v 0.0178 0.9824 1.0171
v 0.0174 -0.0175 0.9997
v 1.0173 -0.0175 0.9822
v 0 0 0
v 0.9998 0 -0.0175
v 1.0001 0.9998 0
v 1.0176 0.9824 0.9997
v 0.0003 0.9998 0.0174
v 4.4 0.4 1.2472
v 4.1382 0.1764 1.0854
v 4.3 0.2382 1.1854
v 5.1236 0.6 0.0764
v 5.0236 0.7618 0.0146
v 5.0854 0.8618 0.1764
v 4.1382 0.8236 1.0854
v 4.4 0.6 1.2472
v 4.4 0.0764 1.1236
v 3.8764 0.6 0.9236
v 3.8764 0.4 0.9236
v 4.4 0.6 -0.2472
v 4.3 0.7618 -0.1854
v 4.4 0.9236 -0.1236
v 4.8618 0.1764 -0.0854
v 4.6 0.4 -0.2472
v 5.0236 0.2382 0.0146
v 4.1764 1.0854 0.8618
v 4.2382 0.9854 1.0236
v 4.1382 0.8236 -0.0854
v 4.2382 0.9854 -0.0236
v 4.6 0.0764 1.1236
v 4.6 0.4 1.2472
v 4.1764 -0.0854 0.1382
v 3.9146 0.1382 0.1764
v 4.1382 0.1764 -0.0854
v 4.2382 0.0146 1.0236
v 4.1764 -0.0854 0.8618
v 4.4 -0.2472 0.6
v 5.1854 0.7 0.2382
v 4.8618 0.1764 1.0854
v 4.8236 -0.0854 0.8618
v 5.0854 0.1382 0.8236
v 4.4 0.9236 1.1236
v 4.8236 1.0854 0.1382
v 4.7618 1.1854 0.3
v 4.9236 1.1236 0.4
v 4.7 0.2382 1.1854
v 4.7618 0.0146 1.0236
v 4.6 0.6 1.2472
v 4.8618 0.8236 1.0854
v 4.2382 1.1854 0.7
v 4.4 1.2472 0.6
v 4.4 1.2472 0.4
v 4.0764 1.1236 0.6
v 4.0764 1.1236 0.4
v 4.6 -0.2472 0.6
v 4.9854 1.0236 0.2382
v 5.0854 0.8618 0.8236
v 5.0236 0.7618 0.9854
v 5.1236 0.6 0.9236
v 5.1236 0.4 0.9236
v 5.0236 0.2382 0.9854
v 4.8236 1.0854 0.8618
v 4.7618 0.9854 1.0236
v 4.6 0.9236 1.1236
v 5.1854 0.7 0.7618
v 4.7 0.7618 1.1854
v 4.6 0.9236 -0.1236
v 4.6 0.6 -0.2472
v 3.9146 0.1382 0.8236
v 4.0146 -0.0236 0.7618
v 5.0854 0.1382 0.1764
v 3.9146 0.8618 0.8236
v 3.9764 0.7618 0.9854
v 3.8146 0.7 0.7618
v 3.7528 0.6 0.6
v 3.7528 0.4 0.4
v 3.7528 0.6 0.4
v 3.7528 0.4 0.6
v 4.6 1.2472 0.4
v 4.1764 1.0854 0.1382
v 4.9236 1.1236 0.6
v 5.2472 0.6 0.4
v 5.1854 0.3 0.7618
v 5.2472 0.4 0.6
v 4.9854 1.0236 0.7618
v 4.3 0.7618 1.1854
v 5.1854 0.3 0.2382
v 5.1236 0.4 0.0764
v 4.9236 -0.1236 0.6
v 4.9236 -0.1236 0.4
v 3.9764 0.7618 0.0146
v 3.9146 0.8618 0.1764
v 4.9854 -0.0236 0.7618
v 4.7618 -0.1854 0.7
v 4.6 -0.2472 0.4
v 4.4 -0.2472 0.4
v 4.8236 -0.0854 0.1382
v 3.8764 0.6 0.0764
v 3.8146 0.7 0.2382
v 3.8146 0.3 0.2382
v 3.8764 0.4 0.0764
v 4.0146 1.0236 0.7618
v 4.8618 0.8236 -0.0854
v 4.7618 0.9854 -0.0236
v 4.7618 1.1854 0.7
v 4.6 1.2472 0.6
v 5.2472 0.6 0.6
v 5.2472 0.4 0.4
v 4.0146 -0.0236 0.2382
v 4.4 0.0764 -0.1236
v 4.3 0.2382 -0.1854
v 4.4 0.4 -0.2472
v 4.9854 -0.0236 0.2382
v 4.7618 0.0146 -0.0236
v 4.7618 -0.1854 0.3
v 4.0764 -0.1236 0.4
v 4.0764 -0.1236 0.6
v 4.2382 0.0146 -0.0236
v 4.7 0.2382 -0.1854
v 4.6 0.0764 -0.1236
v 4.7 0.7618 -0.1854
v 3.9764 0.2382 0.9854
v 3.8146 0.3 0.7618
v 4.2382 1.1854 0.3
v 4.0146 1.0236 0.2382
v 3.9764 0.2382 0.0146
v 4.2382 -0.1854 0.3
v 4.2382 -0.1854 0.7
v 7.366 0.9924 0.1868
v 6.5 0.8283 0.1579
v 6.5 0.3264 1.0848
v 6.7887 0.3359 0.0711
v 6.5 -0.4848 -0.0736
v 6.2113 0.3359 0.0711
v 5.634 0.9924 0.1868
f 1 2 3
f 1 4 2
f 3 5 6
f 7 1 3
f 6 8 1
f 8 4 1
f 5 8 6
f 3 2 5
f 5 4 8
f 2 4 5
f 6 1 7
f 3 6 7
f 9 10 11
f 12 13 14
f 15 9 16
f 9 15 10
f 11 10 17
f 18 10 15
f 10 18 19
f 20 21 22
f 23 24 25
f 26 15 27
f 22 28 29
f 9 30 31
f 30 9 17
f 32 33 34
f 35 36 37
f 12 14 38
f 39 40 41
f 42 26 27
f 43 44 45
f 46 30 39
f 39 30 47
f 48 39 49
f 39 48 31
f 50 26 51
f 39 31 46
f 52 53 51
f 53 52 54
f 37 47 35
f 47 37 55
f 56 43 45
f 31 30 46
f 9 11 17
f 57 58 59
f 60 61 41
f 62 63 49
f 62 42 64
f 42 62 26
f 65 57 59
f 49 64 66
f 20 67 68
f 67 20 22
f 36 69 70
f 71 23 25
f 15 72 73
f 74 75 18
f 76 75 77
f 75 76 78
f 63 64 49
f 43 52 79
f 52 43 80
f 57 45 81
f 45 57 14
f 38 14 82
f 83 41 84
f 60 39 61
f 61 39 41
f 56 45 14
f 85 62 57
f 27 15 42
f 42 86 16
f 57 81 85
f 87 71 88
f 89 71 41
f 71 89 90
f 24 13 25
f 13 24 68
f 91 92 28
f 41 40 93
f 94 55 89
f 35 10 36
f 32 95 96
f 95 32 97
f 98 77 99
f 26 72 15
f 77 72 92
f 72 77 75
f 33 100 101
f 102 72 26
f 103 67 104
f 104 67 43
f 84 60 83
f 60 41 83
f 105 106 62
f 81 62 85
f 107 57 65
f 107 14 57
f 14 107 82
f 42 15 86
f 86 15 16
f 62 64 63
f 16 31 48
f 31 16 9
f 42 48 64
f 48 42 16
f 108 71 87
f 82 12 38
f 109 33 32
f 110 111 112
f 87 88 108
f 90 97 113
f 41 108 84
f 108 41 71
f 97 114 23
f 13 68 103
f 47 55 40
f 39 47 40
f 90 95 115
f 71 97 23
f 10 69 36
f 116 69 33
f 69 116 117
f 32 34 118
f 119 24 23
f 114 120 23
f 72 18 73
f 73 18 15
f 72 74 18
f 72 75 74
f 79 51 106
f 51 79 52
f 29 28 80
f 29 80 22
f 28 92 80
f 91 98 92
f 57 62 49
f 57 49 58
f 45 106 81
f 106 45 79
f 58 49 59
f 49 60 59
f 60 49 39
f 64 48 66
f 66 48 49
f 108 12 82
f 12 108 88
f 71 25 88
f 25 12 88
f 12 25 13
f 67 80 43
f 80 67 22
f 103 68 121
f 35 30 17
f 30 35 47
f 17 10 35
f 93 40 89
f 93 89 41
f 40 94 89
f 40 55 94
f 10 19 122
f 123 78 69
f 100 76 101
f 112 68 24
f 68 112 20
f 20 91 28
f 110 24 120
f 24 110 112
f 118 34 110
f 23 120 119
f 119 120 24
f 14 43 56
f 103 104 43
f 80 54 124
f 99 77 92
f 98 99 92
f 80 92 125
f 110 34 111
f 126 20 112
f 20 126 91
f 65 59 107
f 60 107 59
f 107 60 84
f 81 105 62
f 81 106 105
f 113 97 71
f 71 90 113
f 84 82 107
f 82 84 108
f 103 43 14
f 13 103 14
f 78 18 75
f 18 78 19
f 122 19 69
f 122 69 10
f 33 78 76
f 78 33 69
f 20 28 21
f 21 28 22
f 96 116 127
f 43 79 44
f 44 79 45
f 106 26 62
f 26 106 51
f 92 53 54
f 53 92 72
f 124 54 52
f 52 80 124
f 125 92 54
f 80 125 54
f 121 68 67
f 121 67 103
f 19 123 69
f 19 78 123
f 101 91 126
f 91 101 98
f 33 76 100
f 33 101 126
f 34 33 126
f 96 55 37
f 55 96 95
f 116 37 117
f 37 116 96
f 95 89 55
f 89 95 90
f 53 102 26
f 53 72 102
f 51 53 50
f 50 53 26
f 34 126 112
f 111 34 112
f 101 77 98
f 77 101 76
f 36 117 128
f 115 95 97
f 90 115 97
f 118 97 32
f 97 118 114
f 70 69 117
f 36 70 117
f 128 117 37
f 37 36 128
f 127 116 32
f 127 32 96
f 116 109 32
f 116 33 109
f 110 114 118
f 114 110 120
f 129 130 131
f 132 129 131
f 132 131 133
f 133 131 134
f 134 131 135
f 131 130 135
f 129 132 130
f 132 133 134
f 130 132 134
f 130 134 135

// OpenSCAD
// Used to cause issue #349

// Very slightly non-planar polyhedron
polyhedron(faces=[[3,2,1,0],[7,6,5,4],[0,1,6,7],[1,2,5,6],[2,3,4,5],[3,0,7,4]],
points=[
    [0.0174497,-0.0174524,0.999695],
    [1.0173,-0.0174524,0.982243],
    [1.0176,0.982395,0.999693],
    [0.0177543,0.982395,1.01715],
    [0.000304586,0.999848,0.0174497],
    [1.00015,0.999848,-0.00000265809],
    [0.999848,-0.0000000000000271051,-0.0174524],
    [0,0,0]]);

// Real-world example: truncated icosidodecahedron
translate([4.5,0.5,0.5]) scale(0.02) polyhedron(points = [
[-10., -13.090169943749475, -34.270509831248425],
[-10., -13.090169943749475, 34.270509831248425],
[-10., 13.090169943749475, -34.270509831248425],
[-10., 13.090169943749475, 34.270509831248425],
[-5., -5., -37.3606797749979], [-5., -5., 37.3606797749979],
[-5., 5., -37.3606797749979], [-5., 5., 37.3606797749979],
[-5., -37.3606797749979, -5.], [-5., -37.3606797749979, 5.],
[-5., -21.18033988749895, -31.18033988749895],
[-5., -21.18033988749895, 31.18033988749895], [-5., 37.3606797749979, -5.],
[-5., 37.3606797749979, 5.], [-5., 21.18033988749895, -31.18033988749895],
[-5., 21.18033988749895, 31.18033988749895], [5., -5., -37.3606797749979],
[5., -5., 37.3606797749979], [5., 5., -37.3606797749979],
[5., 5., 37.3606797749979], [5., -37.3606797749979, -5.],
[5., -37.3606797749979, 5.], [5., -21.18033988749895, -31.18033988749895],
[5., -21.18033988749895, 31.18033988749895], [5., 37.3606797749979, -5.],
[5., 37.3606797749979, 5.], [5., 21.18033988749895, -31.18033988749895],
[5., 21.18033988749895, 31.18033988749895], [10., -13.090169943749475,
 -34.270509831248425], [10., -13.090169943749475, 34.270509831248425],
[10., 13.090169943749475, -34.270509831248425],
[10., 13.090169943749475, 34.270509831248425],
[-34.270509831248425, -10., -13.090169943749475],
[-34.270509831248425, -10., 13.090169943749475],
[-34.270509831248425, 10., -13.090169943749475],
[-34.270509831248425, 10., 13.090169943749475],
[-29.270509831248425, -18.090169943749473, -16.18033988749895],
[-29.270509831248425, -18.090169943749473, 16.18033988749895],
[-29.270509831248425, 18.090169943749473, -16.18033988749895],
[-29.270509831248425, 18.090169943749473, 16.18033988749895],
[-18.090169943749473, -16.18033988749895, -29.270509831248425],
[-18.090169943749473, -16.18033988749895, 29.270509831248425],
[-18.090169943749473, 16.18033988749895, -29.270509831248425],
[-18.090169943749473, 16.18033988749895, 29.270509831248425],
[-13.090169943749475, -34.270509831248425, -10.],
[-13.090169943749475, -34.270509831248425, 10.],
[-13.090169943749475, -24.270509831248425, -26.18033988749895],
[-13.090169943749475, -24.270509831248425, 26.18033988749895],
[-13.090169943749475, 24.270509831248425, -26.18033988749895],
[-13.090169943749475, 24.270509831248425, 26.18033988749895],
[-13.090169943749475, 34.270509831248425, -10.],
[-13.090169943749475, 34.270509831248425, 10.],
[-26.18033988749895, -13.090169943749475, -24.270509831248425],
[-26.18033988749895, -13.090169943749475, 24.270509831248425],
[-26.18033988749895, 13.090169943749475, -24.270509831248425],
[-26.18033988749895, 13.090169943749475, 24.270509831248425],
[-37.3606797749979, -5., -5.], [-37.3606797749979, -5., 5.],
[-37.3606797749979, 5., -5.], [-37.3606797749979, 5., 5.],
[-16.18033988749895, -29.270509831248425, -18.090169943749473],
[-16.18033988749895, -29.270509831248425, 18.090169943749473],
[-16.18033988749895, 29.270509831248425, -18.090169943749473],
[-16.18033988749895, 29.270509831248425, 18.090169943749473],
[-31.18033988749895, -5., -21.18033988749895],
[-31.18033988749895, -5., 21.18033988749895],
[-31.18033988749895, 5., -21.18033988749895],
[-31.18033988749895, 5., 21.18033988749895],
[-21.18033988749895, -31.18033988749895, -5.],
[-21.18033988749895, -31.18033988749895, 5.],
[-21.18033988749895, 31.18033988749895, -5.],
[-21.18033988749895, 31.18033988749895, 5.],
[-24.270509831248425, -26.18033988749895, -13.090169943749475],
[-24.270509831248425, -26.18033988749895, 13.090169943749475],
[-24.270509831248425, 26.18033988749895, -13.090169943749475],
[-24.270509831248425, 26.18033988749895, 13.090169943749475],
[16.18033988749895, -29.270509831248425, -18.090169943749473],
[16.18033988749895, -29.270509831248425, 18.090169943749473],
[16.18033988749895, 29.270509831248425, -18.090169943749473],
[16.18033988749895, 29.270509831248425, 18.090169943749473],
[24.270509831248425, -26.18033988749895, -13.090169943749475],
[24.270509831248425, -26.18033988749895, 13.090169943749475],
[24.270509831248425, 26.18033988749895, -13.090169943749475],
[24.270509831248425, 26.18033988749895, 13.090169943749475],
[37.3606797749979, -5., -5.], [37.3606797749979, -5., 5.],
[37.3606797749979, 5., -5.], [37.3606797749979, 5., 5.],
[21.18033988749895, -31.18033988749895, -5.],
[21.18033988749895, -31.18033988749895, 5.],
[21.18033988749895, 31.18033988749895, -5.],
[21.18033988749895, 31.18033988749895, 5.],
[13.090169943749475, -34.270509831248425, -10.],
[13.090169943749475, -34.270509831248425, 10.],
[13.090169943749475, -24.270509831248425, -26.18033988749895],
[13.090169943749475, -24.270509831248425, 26.18033988749895],
[13.090169943749475, 24.270509831248425, -26.18033988749895],
[13.090169943749475, 24.270509831248425, 26.18033988749895],
[13.090169943749475, 34.270509831248425, -10.],
[13.090169943749475, 34.270509831248425, 10.],
[26.18033988749895, -13.090169943749475, -24.270509831248425],
[26.18033988749895, -13.090169943749475, 24.270509831248425],
[26.18033988749895, 13.090169943749475, -24.270509831248425],
[26.18033988749895, 13.090169943749475, 24.270509831248425],
[31.18033988749895, -5., -21.18033988749895],
[31.18033988749895, -5., 21.18033988749895],
[31.18033988749895, 5., -21.18033988749895],
[31.18033988749895, 5., 21.18033988749895],
[18.090169943749473, -16.18033988749895, -29.270509831248425],
[18.090169943749473, -16.18033988749895, 29.270509831248425],
[18.090169943749473, 16.18033988749895, -29.270509831248425],
[18.090169943749473, 16.18033988749895, 29.270509831248425],
[29.270509831248425, -18.090169943749473, -16.18033988749895],
[29.270509831248425, -18.090169943749473, 16.18033988749895],
[29.270509831248425, 18.090169943749473, -16.18033988749895],
[29.270509831248425, 18.090169943749473, 16.18033988749895],
[34.270509831248425, -10., -13.090169943749475],
[34.270509831248425, -10., 13.090169943749475],
[34.270509831248425, 10., -13.090169943749475],
[34.270509831248425, 10., 13.090169943749475]],faces =
[[41, 53, 65, 67, 55, 43, 3, 7, 5, 1], [100, 104, 106, 102, 110, 30, 18, 16,
 28, 108], [11, 1, 5, 17, 29, 23], [18, 30, 26, 14, 2, 6],
[33, 37, 73, 69, 68, 72, 36, 32, 56, 57], [91, 90, 82, 114, 118, 86, 87,
 119, 115, 83], [81, 113, 117, 85, 84, 116, 112, 80, 88, 89],
[59, 58, 34, 38, 74, 70, 71, 75, 39, 35], [0, 10, 22, 28, 16, 4],
[15, 27, 31, 19, 7, 3], [64, 52, 40, 0, 4, 6, 2, 42, 54, 66],
[19, 31, 111, 103, 107, 105, 101, 109, 29, 17], [96, 110, 102, 114, 82, 78],
[53, 41, 47, 61, 73, 37], [43, 49, 15, 3], [94, 108, 28, 22],
[23, 29, 109, 95], [2, 14, 48, 42], [36, 72, 60, 46, 40, 52],
[79, 83, 115, 103, 111, 97], [69, 45, 9, 8, 44, 68],
[24, 98, 90, 91, 99, 25], [77, 95, 109, 101, 113, 81],
[42, 48, 62, 74, 38, 54], [40, 46, 10, 0], [97, 111, 31, 27],
[44, 8, 20, 92, 76, 94, 22, 10, 46, 60], [63, 51, 13, 25, 99, 79, 97, 27,
 15, 49], [26, 30, 110, 96], [1, 11, 47, 41], [55, 39, 75, 63, 49, 43],
[80, 112, 100, 108, 94, 76], [48, 14, 26, 96, 78, 98, 24, 12, 50, 62],
[61, 47, 11, 23, 95, 77, 93, 21, 9, 45], [71, 70, 50, 12, 13, 51],
[93, 89, 88, 92, 20, 21], [102, 106, 118, 114], [65, 53, 37, 33],
[74, 62, 50, 70], [77, 81, 89, 93], [101, 105, 117, 113], [66, 54, 38, 34],
[73, 61, 45, 69], [78, 82, 90, 98], [32, 36, 52, 64], [115, 119, 107, 103],
[92, 88, 80, 76], [71, 51, 63, 75], [56, 32, 64, 66, 34, 58],
[107, 119, 87, 85, 117, 105], [35, 39, 55, 67], [112, 116, 104, 100],
[99, 91, 83, 79], [68, 44, 60, 72], [57, 59, 35, 67, 65, 33],
[116, 84, 86, 118, 106, 104], [4, 16, 18, 6], [7, 19, 17, 5],
[12, 24, 25, 13], [9, 21, 20, 8], [56, 58, 59, 57], [85, 87, 86, 84]]
);

translate([6,0,0]) polyhedron(points = [[0.5, 0.326352, 1.08481], [0.5, 0.828269, 0.157883], [1.36603, 0.992404, 0.186824], [0.788675, 0.335865, 0.0710586], [0.5, -0.484808, -0.0736482], [0.211325, 0.335865, 0.0710586], [-0.366025, 0.992404, 0.186824]], faces = [[0, 1, 2], [0, 2, 3], [0, 3, 4], [0, 4, 5], [0, 5, 6], [0, 6, 1], [6, 5, 4, 3, 2, 1]]);
